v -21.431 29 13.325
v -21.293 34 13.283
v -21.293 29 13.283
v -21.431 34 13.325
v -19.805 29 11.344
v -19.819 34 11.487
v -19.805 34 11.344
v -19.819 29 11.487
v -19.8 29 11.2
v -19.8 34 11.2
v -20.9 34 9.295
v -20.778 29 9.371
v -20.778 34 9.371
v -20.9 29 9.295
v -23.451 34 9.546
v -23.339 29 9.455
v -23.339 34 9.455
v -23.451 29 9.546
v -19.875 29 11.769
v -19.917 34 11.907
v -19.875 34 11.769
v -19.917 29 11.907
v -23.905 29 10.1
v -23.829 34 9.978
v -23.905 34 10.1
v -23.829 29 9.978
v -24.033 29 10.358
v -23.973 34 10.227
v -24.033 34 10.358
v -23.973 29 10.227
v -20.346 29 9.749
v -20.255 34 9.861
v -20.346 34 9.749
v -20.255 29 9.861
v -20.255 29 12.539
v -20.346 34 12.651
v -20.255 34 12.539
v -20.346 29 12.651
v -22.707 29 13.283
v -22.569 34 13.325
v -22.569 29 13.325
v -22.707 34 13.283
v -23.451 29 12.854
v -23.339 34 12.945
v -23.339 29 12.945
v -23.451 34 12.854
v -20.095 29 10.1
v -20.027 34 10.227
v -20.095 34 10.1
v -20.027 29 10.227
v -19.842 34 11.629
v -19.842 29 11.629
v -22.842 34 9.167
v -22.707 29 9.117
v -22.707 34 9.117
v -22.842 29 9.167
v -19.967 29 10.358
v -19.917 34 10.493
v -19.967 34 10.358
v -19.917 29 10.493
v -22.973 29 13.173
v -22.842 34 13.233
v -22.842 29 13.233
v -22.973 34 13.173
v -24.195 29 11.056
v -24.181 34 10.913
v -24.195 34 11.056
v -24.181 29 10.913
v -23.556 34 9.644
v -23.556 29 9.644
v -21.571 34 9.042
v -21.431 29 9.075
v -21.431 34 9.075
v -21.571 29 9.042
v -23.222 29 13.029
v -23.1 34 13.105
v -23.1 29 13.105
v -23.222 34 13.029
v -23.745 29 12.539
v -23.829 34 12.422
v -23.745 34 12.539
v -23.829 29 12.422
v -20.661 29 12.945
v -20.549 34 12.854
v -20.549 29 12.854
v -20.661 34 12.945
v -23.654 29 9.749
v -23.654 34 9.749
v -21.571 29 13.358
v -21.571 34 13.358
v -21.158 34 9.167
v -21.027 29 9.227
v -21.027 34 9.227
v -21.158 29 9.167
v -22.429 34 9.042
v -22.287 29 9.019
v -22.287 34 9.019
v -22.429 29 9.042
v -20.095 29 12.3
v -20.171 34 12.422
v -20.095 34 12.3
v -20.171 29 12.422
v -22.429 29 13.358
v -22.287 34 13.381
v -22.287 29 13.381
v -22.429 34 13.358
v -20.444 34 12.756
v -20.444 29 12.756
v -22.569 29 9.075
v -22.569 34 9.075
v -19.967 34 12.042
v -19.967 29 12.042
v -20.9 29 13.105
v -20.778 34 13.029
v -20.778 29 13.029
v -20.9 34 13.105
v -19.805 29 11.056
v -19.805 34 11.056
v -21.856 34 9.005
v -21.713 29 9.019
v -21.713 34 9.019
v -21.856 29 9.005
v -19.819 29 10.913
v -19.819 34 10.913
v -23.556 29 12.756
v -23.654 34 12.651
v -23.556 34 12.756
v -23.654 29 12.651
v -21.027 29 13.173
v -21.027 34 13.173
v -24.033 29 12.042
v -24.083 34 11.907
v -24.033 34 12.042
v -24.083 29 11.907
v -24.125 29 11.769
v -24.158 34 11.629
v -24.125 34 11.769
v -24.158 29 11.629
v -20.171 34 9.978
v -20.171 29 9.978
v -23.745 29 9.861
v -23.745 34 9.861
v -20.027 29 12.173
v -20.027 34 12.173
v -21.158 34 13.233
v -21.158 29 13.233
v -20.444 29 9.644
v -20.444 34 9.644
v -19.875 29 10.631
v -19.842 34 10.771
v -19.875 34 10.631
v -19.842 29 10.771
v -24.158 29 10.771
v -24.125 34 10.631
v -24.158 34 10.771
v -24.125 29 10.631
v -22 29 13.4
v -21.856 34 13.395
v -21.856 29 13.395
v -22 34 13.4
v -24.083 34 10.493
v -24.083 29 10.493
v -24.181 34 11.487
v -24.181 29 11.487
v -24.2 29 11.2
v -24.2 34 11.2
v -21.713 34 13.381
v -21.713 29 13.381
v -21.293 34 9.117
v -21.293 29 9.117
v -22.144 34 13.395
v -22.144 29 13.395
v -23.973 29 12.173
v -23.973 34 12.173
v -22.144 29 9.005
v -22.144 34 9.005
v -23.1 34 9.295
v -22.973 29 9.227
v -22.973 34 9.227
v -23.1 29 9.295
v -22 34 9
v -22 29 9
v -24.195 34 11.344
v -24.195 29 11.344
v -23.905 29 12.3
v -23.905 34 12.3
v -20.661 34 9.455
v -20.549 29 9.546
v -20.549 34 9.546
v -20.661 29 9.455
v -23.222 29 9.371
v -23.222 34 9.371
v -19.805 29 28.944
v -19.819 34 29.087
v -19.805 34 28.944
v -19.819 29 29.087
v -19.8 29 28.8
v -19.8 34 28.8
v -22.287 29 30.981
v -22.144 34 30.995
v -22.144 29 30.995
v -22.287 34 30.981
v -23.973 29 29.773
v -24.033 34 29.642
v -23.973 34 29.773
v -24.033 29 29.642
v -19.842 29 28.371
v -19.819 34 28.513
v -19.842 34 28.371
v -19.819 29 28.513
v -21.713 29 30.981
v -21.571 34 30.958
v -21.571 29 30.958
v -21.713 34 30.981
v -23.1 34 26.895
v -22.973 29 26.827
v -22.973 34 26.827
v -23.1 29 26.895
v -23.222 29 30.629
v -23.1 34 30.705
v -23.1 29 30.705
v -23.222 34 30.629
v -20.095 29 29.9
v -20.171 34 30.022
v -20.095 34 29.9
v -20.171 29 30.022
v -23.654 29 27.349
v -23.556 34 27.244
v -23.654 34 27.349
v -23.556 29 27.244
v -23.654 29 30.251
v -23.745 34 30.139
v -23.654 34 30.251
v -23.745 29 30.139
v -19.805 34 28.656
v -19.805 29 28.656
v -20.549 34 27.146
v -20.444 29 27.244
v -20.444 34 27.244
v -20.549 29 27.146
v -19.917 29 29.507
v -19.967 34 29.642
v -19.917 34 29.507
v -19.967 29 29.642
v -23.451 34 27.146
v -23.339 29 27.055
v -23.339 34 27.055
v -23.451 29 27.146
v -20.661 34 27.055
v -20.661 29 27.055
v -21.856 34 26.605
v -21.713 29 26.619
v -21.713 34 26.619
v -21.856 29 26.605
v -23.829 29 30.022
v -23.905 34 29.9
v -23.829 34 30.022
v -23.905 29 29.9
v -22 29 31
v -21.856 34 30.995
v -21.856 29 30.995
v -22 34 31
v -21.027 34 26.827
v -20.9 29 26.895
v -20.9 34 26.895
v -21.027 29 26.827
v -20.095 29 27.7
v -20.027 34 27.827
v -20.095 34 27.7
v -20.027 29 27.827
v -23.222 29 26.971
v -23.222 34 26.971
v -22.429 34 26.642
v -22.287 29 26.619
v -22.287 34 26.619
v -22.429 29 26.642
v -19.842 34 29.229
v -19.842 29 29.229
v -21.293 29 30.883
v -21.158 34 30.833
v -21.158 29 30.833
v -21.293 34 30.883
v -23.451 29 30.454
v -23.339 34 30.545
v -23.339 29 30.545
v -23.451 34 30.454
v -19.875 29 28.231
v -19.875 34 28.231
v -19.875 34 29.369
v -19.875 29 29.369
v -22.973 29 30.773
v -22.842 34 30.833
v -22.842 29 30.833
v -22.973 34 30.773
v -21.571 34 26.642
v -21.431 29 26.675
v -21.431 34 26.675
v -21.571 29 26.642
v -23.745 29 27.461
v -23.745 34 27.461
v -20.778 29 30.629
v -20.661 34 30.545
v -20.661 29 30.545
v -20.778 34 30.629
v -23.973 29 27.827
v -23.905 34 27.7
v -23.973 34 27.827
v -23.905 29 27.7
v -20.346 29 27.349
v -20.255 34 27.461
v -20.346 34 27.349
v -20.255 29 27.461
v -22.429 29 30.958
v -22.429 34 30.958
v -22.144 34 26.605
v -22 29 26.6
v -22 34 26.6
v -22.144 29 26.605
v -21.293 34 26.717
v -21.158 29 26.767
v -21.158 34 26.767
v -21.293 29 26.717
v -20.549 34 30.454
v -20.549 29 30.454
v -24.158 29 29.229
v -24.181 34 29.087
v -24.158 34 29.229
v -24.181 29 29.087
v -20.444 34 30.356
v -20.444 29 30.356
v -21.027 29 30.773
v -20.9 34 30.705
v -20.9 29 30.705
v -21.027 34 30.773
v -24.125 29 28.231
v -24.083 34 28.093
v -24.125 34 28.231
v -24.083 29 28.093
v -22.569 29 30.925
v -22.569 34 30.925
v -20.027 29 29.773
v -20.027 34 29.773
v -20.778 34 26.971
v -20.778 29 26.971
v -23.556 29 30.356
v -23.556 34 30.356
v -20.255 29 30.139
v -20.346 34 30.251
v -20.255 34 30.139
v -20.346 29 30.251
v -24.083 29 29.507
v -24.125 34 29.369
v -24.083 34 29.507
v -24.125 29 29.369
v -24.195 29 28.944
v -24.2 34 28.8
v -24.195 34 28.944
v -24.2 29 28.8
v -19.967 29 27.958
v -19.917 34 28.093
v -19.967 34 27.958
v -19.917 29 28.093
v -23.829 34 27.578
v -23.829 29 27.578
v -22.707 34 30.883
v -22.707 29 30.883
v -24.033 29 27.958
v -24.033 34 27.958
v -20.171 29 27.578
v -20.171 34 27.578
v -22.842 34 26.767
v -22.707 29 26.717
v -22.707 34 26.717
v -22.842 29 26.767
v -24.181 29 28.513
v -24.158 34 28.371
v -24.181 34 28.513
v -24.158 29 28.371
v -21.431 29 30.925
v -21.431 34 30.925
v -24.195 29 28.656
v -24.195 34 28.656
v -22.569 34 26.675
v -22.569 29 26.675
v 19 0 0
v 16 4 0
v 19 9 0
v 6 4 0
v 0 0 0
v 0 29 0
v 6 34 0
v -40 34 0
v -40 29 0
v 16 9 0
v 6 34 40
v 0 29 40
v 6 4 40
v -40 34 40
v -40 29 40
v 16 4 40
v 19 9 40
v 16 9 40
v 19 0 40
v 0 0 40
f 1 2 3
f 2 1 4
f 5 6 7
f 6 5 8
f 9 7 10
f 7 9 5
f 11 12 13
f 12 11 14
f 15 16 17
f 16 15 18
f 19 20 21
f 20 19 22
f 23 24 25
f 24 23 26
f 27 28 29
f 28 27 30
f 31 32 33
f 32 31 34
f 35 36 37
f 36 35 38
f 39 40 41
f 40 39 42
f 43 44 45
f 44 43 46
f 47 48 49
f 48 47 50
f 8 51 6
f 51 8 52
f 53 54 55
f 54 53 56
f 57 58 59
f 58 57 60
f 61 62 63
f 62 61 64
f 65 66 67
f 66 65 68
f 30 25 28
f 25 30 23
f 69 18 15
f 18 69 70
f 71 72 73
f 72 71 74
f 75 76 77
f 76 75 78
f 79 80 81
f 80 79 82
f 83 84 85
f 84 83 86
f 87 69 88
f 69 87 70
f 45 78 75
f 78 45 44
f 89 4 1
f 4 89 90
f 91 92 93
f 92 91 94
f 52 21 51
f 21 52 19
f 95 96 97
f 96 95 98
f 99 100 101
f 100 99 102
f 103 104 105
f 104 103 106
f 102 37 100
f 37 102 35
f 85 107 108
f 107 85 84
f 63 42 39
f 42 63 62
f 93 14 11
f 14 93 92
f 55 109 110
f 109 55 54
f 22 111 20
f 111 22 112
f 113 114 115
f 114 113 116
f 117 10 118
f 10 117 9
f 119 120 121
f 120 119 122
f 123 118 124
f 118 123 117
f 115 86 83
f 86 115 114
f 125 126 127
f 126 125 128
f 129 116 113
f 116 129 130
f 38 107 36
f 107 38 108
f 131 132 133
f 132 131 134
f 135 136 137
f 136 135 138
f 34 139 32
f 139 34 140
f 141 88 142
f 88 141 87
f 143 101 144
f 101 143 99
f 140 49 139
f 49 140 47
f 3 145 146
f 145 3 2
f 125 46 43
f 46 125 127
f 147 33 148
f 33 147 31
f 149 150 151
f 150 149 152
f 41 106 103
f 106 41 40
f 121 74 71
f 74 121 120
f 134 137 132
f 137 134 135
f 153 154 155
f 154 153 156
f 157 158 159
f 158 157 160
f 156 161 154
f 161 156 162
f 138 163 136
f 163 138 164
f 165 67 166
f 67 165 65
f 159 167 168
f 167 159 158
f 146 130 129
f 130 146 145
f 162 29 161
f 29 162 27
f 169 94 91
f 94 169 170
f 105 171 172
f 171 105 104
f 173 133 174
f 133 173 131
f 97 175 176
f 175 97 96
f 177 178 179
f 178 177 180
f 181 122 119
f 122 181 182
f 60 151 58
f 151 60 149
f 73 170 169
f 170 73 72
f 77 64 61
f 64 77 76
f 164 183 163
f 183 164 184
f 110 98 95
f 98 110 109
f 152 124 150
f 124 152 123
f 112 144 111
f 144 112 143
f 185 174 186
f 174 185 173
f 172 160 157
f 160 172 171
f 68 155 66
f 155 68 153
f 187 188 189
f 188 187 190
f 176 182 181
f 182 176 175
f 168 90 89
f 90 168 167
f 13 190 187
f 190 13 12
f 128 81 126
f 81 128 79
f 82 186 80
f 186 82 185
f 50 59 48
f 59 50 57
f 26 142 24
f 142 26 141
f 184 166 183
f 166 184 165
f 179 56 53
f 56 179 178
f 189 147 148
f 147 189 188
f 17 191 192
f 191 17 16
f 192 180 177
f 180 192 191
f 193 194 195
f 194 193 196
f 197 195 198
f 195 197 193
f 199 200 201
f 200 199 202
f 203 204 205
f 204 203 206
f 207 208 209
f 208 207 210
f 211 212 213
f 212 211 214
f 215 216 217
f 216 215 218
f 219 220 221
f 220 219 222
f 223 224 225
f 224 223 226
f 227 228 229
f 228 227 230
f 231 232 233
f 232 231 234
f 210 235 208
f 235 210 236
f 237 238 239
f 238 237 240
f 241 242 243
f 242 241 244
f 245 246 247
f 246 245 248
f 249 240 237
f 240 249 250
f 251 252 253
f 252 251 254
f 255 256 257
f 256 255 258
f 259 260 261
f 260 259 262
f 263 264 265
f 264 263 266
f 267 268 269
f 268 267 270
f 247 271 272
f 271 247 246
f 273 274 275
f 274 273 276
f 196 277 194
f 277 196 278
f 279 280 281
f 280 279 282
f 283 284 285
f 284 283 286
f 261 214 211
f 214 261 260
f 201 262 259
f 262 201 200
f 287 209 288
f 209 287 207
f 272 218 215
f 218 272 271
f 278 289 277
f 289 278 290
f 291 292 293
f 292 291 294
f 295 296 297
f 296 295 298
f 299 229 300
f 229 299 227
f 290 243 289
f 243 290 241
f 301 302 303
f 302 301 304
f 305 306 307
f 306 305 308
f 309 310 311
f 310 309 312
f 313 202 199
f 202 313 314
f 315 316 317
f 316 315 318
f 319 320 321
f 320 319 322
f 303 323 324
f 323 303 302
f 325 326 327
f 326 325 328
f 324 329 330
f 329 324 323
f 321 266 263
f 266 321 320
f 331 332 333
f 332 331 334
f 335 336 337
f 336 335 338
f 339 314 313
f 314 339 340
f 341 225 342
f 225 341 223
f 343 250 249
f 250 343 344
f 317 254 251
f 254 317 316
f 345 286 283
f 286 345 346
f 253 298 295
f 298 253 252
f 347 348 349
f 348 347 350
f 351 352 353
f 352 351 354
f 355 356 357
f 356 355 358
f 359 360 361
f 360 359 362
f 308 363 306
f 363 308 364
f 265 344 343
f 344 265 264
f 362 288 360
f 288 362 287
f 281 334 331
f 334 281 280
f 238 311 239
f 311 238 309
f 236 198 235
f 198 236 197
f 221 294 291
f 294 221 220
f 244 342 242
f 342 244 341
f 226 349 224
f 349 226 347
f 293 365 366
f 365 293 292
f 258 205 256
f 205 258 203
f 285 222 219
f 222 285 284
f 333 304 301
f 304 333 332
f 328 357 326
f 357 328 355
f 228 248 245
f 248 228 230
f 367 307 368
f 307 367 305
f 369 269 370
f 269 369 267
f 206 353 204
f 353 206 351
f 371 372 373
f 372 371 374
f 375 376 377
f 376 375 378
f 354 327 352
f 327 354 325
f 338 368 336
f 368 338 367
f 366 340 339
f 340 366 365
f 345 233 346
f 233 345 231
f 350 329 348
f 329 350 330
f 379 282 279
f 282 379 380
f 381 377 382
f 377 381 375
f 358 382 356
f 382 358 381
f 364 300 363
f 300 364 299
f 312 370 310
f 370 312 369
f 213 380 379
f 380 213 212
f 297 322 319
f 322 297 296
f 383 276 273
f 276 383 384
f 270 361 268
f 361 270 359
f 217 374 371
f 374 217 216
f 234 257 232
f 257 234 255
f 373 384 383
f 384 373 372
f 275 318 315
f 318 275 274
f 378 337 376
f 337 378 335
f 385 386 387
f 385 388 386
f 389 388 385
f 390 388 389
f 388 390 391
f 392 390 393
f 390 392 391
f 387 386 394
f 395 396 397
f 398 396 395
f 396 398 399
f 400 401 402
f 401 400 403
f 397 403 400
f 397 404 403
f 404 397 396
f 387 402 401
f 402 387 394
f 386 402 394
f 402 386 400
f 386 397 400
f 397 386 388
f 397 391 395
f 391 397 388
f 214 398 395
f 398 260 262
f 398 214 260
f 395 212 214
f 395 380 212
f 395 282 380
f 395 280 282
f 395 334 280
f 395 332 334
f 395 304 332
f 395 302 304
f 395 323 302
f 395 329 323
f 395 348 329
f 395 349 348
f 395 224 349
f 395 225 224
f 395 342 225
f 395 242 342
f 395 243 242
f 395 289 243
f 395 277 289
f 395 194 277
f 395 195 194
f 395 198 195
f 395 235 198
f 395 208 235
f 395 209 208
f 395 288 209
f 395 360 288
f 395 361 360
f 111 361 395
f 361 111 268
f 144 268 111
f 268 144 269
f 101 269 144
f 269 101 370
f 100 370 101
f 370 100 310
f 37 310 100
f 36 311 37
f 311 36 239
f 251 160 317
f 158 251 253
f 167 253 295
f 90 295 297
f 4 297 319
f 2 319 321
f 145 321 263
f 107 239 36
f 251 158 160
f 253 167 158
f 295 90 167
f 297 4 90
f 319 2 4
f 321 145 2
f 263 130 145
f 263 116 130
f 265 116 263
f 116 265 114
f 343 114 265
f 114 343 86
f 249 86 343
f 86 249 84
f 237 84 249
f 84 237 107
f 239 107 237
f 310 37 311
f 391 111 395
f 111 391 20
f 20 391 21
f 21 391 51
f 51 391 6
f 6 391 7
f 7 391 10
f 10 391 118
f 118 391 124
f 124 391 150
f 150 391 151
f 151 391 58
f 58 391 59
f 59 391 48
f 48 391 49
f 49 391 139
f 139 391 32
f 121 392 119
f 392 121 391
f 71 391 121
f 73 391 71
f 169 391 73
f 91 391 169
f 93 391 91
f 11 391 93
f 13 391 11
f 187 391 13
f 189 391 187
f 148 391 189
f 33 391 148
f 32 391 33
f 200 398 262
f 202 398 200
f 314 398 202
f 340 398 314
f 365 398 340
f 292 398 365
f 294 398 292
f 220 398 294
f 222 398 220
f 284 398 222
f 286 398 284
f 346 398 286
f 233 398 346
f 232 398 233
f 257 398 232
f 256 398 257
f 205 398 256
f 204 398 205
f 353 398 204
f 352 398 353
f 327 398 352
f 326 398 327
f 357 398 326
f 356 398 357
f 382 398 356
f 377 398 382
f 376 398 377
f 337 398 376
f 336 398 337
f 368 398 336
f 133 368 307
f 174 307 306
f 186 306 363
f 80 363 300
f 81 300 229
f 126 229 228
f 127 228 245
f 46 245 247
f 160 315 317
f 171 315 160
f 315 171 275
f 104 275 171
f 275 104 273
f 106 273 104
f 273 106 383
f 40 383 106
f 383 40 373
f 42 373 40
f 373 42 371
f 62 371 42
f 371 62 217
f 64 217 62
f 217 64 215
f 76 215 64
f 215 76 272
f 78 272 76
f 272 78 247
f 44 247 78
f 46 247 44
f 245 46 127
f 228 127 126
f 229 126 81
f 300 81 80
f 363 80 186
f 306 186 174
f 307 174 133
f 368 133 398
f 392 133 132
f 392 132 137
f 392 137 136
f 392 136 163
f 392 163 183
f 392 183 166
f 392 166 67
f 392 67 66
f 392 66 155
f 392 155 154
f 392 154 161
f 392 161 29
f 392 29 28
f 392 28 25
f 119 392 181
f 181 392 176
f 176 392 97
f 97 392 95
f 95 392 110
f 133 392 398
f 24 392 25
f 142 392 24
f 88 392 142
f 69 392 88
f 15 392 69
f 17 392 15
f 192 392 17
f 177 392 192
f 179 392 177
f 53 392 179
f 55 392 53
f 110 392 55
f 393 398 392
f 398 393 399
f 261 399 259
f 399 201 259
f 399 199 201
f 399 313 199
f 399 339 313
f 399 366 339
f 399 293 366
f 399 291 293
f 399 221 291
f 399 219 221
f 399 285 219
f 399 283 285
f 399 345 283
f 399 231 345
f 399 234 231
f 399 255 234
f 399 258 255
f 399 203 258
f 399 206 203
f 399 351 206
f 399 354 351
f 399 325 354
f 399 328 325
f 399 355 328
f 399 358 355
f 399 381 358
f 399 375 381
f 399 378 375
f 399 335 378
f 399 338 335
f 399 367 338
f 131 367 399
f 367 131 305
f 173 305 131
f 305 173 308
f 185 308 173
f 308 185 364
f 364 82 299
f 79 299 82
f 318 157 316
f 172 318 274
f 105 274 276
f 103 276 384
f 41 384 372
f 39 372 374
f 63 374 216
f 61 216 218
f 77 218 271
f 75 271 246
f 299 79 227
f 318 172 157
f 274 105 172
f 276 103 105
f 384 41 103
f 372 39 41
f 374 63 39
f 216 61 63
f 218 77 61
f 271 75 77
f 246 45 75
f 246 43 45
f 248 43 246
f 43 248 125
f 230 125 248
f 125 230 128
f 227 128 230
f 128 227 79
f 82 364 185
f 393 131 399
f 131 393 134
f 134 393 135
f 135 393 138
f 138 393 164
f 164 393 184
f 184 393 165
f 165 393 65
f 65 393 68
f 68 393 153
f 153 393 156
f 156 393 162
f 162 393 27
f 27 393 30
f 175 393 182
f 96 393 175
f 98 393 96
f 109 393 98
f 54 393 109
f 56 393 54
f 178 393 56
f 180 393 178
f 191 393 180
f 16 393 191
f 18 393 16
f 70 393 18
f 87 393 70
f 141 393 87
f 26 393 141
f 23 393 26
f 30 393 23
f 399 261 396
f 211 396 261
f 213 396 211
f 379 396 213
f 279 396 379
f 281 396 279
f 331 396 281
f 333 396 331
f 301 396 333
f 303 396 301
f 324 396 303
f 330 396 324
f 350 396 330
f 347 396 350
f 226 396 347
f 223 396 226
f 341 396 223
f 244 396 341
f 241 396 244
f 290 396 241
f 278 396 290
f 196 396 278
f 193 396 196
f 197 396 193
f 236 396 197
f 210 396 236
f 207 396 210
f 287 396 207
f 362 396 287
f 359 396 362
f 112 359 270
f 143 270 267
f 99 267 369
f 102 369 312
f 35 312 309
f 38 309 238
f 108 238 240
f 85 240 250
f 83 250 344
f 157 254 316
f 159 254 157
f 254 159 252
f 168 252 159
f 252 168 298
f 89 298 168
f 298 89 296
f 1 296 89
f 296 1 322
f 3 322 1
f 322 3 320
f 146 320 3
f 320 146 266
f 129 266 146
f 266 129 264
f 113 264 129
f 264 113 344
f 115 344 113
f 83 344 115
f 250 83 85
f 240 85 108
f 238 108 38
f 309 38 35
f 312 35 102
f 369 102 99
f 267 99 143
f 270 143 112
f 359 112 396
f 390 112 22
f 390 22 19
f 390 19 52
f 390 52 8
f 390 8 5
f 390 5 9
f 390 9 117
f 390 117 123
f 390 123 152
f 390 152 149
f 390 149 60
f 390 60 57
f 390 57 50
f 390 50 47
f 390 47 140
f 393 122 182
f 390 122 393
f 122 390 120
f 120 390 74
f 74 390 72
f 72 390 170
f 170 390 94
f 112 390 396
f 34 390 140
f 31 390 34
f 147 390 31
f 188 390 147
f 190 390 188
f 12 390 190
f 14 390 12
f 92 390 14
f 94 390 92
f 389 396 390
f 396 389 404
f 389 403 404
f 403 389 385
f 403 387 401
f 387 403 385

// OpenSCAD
// file: common.scad
// common.scad — shared parameters for the aquarium grow-box parts.
// Everything downstream is driven from here. Measure YOUR tank, fan and lid
// with calipers and edit this file; do not trust the defaults.

$fn = 96;

/* ---------------- measured inputs ---------------- */
glass_t  = 6;      // tank wall glass thickness. 20-long / 29 gal is usually 5-6 mm.
rim_w    = 14;     // width of the plastic top trim, front to back
rim_h    = 16;     // height of the plastic top trim
lid_t    = 3;      // lid sheet thickness. 3 mm polycarbonate is the default.
duct_nom = 101.6;  // 4 in duct. Use 152.4 for a 6 in fan.
probe_d  = 10;     // sensor-probe body diameter
cable_d  = 6;      // fattest cable that must pass through the lid

/* ---------------- print fit ---------------- */
slop = 0.35;  // clearance per side on sliding fits
wall = 3;     // default wall thickness
eps  = 0.01;  // z-fighting guard

/* ---------------- helpers ---------------- */

// A ring of clearance holes, drilled from z=0 upward.
module bolt_ring(count, radius, hole_d, depth) {
    for (i = [0 : count - 1])
        rotate([0, 0, i * 360 / count])
            translate([radius, 0, -eps])
                cylinder(d = hole_d, h = depth + 2 * eps);
}

// Rounded rectangular plate centred on the origin, sitting on z=0.
module rounded_plate(x, y, z, r = 4) {
    hull()
        for (dx = [-1, 1], dy = [-1, 1])
            translate([dx * (x / 2 - r), dy * (y / 2 - r), 0])
                cylinder(r = r, h = z);
}

// Four corner clearance holes inset from the edges of an x by y plate.
module corner_holes(x, y, inset, hole_d, depth) {
    for (dx = [-1, 1], dy = [-1, 1])
        translate([dx * (x / 2 - inset), dy * (y / 2 - inset), -eps])
            cylinder(d = hole_d, h = depth + 2 * eps);
}

// Upside-down U that straddles the tank's top trim. Opening faces -z, length
// runs along x. -y is the tank interior, +y is the outside.
// `outer_foot` extends the outer wall down the outside glass: that is what
// stops a hanging load from levering the part off the rim. Put a strip of EVA
// foam between the foot and the glass.
// Each part that uses this picks its own print orientation; see the table in
// README.md rather than assuming one here.
module rim_saddle(len = 40, jaw = rim_w, depth = rim_h * 0.8, t = wall,
                  outer_foot = 0) {
    union() {
        difference() {
            translate([-len / 2, -(jaw / 2 + t), 0])
                cube([len, jaw + 2 * t, depth + t]);
            translate([-len / 2 - eps, -(jaw / 2 + slop), -eps])
                cube([len + 2 * eps, jaw + 2 * slop, depth + eps]);
        }
        if (outer_foot > 0)
            translate([-len / 2, jaw / 2 + slop, -outer_foot])
                cube([len, t - slop, outer_foot + eps]);
    }
}

// Height of the top face of a default rim_saddle.
saddle_top = rim_h * 0.8 + wall;

// Right-triangle brace: base `len` along +x, `height` along +z, `thick` in -y.
module gusset(len, height, thick) {
    rotate([90, 0, 0])
        linear_extrude(height = thick)
            polygon([[0, 0], [len, 0], [0, height]]);
}
// main file
// light_mount.scad — carries the LED board under the lid with an air gap, so
// the box is self-contained and there is no mast hanging off it. Two brackets,
// one at each end of the board. The board tilts in from below and the lip stops
// it dropping back out.
//
// In an all-in-one there is nowhere to dump the light's heat, so the board's
// wattage IS the box's thermostat. Size it to the box, not to a grow tent.
// Print as modelled: the profile lies flat on the bed, no supports.

include <common.scad>

board_t  = 11;      // IONBOARD S22 is 0.43 in; measure yours
ledge    = 10;      // how much board edge sits on the shelf
lip_h    = 5;       // retaining lip
lip_w    = 3;
shelf_t  = 4;
gap      = 14;      // air gap between lid and the top of the board
web_t    = 6;       // drop leg thickness
plate_x  = 40;      // bolt plate reach, outboard of the board
plate_t  = 5;
bw       = 40;      // bracket width
bolt_d   = 4.4;     // M4 clearance

H = shelf_t + board_t + gap + plate_t;   // shelf underside to lid face

module bracket_profile() {
    polygon([
        [0, 0],
        [web_t + ledge + lip_w, 0],
        [web_t + ledge + lip_w, shelf_t + lip_h],
        [web_t + ledge, shelf_t + lip_h],
        [web_t + ledge, shelf_t],
        [web_t, shelf_t],
        [web_t, H],
        [-plate_x, H],
        [-plate_x, H - plate_t],
        [0, H - plate_t]
    ]);
}

module light_mount() {
    difference() {
        linear_extrude(height = bw) bracket_profile();
        // lid bolts, through the plate
        for (zz = [bw * 0.28, bw * 0.72])
            translate([-plate_x * 0.55, H + 1, zz])
                rotate([90, 0, 0])
                    cylinder(d = bolt_d, h = plate_t + 2);
    }
}

light_mount();
